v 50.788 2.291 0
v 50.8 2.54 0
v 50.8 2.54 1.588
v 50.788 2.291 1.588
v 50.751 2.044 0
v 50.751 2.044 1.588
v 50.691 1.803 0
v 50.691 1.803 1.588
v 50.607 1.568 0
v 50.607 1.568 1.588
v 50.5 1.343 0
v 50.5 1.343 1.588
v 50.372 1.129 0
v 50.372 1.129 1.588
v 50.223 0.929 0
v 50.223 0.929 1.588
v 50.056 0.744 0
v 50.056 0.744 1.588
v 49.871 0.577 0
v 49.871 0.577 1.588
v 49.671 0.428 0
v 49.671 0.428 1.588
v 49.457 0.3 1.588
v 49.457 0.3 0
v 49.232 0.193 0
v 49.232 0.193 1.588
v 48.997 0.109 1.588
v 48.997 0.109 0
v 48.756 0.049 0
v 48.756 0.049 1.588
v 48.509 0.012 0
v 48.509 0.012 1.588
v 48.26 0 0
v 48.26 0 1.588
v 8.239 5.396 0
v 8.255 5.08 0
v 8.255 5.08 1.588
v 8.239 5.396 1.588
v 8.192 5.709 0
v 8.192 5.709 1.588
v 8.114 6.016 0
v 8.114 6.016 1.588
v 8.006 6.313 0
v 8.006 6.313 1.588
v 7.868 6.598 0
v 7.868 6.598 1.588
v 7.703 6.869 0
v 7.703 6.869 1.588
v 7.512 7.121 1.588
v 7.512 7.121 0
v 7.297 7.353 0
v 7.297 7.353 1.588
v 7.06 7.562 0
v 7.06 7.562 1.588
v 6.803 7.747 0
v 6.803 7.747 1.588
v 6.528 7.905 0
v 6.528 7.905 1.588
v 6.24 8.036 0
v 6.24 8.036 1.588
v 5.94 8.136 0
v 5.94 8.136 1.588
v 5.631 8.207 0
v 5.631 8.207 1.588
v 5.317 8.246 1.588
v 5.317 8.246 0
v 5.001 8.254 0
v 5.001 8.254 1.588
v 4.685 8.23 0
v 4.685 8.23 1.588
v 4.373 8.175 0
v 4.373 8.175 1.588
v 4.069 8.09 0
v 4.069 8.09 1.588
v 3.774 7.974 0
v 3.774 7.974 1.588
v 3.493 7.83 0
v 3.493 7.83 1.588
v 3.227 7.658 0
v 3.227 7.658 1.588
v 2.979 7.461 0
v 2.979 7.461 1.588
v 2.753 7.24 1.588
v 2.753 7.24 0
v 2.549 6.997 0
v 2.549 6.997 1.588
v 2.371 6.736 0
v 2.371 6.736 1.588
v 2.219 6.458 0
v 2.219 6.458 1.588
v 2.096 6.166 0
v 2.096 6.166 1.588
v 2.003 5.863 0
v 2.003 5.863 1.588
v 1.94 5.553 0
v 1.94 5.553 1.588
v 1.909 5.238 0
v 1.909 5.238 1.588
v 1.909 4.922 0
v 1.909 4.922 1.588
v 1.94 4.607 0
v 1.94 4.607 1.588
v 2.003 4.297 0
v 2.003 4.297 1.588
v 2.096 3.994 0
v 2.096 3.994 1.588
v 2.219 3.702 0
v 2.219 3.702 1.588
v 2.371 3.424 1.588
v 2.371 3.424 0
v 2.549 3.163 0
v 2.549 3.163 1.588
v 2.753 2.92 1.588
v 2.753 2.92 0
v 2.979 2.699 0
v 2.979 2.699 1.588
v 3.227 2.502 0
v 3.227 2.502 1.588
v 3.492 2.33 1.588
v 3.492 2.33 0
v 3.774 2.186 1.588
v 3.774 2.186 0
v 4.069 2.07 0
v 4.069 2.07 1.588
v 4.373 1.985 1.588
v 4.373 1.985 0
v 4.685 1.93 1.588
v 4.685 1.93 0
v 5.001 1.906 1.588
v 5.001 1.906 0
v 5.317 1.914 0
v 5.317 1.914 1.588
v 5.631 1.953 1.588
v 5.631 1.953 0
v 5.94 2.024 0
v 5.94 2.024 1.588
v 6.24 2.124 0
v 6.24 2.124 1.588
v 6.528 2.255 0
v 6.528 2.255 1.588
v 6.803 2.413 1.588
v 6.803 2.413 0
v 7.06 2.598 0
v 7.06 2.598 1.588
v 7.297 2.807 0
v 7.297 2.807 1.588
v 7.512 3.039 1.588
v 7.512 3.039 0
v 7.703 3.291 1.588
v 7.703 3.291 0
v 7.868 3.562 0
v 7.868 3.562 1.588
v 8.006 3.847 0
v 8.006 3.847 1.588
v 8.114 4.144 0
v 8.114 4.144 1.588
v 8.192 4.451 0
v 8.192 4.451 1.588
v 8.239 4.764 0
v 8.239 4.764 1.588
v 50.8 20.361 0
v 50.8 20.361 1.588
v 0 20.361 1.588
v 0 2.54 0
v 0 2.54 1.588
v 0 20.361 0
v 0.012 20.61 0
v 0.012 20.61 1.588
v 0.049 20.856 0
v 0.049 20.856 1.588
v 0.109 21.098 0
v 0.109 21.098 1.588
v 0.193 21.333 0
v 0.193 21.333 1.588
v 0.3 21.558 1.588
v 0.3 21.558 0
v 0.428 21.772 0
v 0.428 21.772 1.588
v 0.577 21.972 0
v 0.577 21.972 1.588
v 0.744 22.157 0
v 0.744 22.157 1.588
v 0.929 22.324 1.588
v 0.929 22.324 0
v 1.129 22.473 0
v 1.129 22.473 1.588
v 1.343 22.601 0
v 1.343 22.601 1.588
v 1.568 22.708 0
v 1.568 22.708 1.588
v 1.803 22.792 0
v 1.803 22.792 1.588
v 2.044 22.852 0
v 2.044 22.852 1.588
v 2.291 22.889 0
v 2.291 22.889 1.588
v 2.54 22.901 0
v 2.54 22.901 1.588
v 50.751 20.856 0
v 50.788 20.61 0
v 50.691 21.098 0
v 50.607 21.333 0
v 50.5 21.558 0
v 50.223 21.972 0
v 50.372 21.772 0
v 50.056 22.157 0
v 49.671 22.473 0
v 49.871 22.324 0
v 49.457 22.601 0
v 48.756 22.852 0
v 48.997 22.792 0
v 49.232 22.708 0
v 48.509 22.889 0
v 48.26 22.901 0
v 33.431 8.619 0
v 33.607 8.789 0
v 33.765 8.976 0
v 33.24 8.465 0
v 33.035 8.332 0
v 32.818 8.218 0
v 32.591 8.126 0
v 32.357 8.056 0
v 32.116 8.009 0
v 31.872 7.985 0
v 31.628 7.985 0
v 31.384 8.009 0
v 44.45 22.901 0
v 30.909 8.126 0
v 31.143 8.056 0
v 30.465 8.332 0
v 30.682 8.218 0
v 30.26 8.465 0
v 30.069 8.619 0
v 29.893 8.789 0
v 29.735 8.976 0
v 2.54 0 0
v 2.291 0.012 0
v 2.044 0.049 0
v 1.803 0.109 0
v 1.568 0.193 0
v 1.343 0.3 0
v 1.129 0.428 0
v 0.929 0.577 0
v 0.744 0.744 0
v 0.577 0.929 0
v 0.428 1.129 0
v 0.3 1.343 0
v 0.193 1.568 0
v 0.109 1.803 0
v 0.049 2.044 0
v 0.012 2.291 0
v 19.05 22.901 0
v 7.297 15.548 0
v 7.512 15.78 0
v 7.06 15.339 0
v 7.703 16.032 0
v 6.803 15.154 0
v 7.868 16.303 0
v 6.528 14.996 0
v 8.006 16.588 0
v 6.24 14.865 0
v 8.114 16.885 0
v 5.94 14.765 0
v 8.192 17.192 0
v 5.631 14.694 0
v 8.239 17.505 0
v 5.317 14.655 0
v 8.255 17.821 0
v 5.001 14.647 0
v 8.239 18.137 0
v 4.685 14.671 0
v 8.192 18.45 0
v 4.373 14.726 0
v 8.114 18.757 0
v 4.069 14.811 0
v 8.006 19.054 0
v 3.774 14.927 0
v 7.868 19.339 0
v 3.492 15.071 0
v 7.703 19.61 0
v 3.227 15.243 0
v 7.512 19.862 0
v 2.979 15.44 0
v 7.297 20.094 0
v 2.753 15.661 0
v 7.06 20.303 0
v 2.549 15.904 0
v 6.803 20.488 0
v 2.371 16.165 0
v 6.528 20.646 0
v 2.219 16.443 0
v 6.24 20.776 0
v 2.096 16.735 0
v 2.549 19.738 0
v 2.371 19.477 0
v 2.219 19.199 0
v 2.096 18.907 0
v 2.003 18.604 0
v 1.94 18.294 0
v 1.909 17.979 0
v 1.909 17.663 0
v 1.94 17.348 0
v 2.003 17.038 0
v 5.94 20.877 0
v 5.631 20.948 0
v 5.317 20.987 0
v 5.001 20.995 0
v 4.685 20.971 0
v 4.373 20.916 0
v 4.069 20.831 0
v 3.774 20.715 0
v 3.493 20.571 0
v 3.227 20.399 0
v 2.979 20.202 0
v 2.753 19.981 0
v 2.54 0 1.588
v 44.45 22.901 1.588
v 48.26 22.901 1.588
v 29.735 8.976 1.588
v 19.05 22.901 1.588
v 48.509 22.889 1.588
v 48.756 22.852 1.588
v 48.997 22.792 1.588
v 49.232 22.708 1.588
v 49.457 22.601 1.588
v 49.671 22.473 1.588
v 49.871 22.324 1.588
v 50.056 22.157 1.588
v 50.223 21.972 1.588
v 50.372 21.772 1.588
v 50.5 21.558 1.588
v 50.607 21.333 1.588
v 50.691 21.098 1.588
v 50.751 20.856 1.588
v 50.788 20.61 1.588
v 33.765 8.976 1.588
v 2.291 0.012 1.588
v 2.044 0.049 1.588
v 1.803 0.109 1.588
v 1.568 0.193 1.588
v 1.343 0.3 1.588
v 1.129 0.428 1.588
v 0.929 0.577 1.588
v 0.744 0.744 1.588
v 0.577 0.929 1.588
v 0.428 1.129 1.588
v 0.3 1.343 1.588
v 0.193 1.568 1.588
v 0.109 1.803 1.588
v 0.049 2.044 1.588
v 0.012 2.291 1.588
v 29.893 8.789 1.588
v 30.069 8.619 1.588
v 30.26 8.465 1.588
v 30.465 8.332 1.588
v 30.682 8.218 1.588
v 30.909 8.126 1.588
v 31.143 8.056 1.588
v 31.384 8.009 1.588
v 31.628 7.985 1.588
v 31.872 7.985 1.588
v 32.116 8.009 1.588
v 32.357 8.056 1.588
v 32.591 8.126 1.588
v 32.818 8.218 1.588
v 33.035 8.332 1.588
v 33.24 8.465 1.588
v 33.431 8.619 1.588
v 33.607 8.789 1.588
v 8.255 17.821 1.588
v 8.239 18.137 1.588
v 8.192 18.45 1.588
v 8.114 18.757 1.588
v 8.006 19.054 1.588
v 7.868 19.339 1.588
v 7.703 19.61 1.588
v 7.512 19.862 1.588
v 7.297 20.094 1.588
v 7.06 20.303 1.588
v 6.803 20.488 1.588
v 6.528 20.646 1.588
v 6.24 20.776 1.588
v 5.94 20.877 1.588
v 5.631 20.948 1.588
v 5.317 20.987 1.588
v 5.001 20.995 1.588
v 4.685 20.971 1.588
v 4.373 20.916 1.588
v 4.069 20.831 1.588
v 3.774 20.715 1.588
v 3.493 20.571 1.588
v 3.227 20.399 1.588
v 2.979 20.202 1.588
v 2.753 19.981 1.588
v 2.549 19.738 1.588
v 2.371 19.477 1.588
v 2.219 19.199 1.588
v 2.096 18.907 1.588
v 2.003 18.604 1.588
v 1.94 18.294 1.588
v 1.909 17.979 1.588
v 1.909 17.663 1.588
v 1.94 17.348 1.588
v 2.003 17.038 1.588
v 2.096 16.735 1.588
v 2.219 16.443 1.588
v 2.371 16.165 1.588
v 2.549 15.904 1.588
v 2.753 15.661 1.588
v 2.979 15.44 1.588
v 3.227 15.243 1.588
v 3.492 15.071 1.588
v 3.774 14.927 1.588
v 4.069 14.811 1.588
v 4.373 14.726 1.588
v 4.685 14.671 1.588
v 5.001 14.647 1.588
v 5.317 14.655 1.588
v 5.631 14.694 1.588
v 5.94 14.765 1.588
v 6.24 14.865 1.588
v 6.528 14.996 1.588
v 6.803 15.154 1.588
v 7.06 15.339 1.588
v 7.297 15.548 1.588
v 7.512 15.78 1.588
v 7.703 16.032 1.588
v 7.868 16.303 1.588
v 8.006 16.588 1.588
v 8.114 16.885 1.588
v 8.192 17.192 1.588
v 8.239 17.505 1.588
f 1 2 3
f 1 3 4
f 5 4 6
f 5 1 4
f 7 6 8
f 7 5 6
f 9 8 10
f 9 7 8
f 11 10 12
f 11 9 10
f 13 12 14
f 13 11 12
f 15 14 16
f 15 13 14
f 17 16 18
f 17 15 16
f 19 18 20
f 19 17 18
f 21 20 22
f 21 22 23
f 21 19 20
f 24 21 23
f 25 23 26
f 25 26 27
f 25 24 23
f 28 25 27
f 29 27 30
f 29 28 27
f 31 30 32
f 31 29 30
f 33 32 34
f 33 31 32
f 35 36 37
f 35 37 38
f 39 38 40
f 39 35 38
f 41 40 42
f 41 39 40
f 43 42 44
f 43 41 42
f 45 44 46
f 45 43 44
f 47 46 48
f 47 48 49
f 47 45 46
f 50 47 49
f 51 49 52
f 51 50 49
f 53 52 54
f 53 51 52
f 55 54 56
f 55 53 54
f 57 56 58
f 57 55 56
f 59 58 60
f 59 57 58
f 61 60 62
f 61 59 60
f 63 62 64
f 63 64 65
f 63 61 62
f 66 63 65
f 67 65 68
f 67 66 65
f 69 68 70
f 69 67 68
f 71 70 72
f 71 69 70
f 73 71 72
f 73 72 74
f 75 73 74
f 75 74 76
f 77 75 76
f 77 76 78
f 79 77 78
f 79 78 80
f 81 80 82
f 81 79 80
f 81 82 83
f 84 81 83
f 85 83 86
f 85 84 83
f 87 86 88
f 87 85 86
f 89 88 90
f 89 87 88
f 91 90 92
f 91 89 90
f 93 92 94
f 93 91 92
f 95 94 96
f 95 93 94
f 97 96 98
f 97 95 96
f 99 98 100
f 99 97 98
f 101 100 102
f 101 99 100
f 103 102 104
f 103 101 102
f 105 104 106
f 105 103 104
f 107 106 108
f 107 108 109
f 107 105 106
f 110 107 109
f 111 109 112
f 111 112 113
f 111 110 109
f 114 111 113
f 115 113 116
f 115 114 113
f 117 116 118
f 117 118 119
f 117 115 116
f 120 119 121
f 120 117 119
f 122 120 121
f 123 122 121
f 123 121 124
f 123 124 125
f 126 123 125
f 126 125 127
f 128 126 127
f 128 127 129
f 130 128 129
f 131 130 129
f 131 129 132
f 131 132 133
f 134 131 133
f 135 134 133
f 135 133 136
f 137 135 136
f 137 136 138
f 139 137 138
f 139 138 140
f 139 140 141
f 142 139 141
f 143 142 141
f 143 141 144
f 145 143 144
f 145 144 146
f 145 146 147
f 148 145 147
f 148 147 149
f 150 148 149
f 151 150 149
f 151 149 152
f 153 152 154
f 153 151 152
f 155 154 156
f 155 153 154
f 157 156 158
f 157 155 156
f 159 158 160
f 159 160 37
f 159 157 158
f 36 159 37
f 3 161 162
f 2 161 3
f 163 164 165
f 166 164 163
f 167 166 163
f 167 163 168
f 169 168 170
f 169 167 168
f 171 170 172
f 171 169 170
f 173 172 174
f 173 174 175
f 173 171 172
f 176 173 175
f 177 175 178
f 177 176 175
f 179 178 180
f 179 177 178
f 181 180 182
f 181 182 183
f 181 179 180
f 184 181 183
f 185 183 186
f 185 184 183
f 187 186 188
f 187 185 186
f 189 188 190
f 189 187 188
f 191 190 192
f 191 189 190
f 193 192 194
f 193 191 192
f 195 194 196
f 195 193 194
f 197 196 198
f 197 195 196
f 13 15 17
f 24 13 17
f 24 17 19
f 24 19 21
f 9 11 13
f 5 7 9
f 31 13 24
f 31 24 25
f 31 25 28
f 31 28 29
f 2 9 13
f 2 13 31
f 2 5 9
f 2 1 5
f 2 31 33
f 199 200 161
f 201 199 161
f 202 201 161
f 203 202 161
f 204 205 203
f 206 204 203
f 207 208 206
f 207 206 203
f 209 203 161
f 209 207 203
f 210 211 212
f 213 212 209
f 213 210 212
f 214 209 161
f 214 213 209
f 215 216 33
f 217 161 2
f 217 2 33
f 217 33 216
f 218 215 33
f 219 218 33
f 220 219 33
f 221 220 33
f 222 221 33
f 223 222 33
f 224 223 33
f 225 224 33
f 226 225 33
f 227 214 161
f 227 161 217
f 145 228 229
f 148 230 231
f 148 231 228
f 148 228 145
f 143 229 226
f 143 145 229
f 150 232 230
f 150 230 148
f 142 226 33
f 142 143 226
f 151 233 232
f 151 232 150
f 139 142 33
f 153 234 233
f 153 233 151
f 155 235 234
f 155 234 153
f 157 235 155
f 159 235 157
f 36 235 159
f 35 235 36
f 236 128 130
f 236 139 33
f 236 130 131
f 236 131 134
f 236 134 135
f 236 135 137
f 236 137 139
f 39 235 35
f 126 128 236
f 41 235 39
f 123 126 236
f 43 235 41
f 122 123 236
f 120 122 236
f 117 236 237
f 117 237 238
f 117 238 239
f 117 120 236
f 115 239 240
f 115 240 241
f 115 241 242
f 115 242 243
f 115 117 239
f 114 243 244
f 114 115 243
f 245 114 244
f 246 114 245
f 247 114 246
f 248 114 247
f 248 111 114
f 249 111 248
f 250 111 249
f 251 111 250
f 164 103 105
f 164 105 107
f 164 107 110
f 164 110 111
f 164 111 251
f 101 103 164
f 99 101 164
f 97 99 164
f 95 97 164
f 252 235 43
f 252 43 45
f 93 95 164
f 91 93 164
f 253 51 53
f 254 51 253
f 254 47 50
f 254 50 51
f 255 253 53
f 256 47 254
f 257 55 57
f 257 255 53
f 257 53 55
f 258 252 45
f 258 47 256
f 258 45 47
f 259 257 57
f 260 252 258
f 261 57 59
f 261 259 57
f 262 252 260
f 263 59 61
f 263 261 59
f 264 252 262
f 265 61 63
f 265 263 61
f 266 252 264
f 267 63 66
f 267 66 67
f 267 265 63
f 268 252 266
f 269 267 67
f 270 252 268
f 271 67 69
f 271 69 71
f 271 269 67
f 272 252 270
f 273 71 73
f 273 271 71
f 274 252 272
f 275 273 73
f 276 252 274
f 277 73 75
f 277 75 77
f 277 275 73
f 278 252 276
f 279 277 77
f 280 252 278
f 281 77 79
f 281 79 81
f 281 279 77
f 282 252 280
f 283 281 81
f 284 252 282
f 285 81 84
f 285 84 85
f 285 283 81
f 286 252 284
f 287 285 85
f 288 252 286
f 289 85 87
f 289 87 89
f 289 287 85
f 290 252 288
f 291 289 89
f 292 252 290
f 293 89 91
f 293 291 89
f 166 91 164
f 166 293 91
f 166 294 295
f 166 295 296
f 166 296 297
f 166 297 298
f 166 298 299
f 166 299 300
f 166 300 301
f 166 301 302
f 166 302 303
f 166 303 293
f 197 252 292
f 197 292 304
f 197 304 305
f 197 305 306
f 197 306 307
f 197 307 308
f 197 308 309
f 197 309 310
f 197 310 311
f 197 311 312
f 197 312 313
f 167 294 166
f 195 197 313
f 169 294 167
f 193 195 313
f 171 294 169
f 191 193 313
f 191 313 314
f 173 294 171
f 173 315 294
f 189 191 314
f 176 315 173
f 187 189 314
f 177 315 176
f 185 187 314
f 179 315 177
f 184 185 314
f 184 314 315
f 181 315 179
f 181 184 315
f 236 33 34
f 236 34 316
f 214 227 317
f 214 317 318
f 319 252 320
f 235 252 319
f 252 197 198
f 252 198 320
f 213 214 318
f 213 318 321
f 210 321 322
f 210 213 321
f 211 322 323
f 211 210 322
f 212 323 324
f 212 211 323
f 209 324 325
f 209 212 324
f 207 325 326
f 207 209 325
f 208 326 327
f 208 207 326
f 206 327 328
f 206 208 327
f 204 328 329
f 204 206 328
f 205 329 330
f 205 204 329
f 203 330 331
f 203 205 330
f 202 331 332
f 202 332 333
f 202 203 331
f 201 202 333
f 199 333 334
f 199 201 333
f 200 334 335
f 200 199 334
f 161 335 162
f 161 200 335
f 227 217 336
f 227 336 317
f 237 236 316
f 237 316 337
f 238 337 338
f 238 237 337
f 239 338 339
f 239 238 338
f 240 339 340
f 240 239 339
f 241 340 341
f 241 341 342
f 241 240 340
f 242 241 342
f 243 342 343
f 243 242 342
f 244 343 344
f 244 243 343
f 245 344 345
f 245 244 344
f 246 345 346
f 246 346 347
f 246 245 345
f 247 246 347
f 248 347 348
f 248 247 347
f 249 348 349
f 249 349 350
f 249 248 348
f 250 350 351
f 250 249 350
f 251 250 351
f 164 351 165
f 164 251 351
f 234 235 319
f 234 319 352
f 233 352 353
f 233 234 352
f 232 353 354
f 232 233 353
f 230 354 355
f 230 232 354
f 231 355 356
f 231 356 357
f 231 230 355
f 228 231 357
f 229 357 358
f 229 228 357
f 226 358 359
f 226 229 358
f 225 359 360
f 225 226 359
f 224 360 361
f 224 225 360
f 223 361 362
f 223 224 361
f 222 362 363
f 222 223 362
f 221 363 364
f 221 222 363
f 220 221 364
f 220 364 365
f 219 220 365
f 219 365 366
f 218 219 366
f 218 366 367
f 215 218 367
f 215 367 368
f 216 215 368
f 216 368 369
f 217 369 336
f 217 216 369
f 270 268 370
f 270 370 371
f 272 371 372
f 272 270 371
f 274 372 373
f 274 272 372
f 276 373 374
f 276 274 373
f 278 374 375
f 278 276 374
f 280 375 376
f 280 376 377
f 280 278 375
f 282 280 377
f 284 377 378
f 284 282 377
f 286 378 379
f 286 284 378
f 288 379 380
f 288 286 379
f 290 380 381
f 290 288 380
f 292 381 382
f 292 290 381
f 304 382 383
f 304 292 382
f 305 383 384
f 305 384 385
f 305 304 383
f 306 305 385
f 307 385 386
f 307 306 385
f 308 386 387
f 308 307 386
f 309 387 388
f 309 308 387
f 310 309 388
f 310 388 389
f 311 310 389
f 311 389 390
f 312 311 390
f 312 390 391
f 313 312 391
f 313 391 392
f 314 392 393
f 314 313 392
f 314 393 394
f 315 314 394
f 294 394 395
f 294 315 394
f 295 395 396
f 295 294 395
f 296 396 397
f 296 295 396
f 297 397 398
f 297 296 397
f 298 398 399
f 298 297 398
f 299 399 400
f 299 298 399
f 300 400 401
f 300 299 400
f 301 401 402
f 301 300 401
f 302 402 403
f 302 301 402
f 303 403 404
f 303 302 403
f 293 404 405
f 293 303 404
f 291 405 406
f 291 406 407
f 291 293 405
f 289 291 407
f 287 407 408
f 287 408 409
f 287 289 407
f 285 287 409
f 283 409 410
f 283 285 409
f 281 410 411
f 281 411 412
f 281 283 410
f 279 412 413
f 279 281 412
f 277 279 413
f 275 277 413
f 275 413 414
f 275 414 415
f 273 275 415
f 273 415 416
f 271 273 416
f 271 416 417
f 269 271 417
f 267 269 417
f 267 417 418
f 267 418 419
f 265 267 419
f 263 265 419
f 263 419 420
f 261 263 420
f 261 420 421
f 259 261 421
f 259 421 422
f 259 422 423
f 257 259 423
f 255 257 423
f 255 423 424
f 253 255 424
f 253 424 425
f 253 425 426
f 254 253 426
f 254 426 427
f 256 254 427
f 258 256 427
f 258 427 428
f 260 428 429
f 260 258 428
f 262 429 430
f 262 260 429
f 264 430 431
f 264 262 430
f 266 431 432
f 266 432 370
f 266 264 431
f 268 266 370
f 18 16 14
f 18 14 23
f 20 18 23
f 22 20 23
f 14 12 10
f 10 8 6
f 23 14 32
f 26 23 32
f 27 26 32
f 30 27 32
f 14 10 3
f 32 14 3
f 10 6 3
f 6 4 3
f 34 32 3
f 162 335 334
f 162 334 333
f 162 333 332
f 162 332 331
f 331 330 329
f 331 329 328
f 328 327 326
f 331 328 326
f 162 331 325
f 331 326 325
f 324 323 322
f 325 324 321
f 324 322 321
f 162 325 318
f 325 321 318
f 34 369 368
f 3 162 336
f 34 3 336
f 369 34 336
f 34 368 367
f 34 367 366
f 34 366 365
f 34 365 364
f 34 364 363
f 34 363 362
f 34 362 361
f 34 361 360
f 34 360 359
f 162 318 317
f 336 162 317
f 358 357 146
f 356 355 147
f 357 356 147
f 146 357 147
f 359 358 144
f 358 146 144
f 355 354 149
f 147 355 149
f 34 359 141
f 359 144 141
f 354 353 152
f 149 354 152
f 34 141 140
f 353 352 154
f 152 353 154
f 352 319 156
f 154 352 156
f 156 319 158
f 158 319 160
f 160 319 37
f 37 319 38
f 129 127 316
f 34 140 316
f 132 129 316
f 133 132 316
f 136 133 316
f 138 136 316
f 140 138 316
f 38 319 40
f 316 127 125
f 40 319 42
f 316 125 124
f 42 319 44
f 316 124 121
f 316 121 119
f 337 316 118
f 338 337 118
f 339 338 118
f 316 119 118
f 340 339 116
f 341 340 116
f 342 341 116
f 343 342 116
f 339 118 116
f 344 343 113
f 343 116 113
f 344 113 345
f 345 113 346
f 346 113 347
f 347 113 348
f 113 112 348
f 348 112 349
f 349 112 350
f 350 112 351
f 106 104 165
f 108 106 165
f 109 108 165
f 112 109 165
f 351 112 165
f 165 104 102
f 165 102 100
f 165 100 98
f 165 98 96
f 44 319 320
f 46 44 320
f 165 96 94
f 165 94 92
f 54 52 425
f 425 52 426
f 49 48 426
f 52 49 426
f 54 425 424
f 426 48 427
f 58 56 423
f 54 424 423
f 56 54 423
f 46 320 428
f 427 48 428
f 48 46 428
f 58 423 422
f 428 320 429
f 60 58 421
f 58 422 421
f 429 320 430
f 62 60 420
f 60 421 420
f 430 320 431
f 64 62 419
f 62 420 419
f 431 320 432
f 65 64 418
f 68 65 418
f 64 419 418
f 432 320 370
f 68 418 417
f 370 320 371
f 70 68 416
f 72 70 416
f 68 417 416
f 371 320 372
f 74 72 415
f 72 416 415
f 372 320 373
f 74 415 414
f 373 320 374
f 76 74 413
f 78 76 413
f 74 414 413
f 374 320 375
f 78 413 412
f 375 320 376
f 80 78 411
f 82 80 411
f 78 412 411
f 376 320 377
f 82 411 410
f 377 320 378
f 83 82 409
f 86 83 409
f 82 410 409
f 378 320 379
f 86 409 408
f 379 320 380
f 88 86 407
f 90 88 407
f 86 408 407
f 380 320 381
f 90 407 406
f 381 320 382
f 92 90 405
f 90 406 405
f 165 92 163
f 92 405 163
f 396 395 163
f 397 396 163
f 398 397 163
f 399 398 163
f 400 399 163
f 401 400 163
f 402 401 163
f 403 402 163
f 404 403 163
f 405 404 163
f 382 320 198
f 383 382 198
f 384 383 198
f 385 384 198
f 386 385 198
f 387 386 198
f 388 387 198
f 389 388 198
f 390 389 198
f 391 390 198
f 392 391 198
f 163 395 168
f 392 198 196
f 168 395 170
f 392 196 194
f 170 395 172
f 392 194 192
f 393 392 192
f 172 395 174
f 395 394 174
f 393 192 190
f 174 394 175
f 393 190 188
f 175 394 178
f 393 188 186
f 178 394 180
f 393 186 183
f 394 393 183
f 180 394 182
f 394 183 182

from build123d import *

# Parameters (mm, degrees)
SKETCH2_R           = 3.175
BOSS_EXTRUDE1_DEPTH = 1.5875


with BuildPart() as part:
    # Sketch2 → Boss-Extrude1 (new body)
    with BuildSketch(Plane.XY):
        with BuildLine():
            Line((19.05, 22.900962235), (29.734882516, 8.976152235))
            ThreePointArc((29.734882516, 8.976152235), (31.75, 7.982406265), (33.765117484, 8.976152235))
            Line((33.765117484, 8.976152235), (44.45, 22.900962235))
            Line((44.45, 22.900962235), (48.26, 22.900962235))
            ThreePointArc((48.26, 22.900962235), (50.056051224, 22.157013459), (50.8, 20.360962235))
            Line((50.8, 20.360962235), (50.8, 2.54))
            ThreePointArc((50.8, 2.54), (50.056051224, 0.743948776), (48.26, 0))
            Line((48.26, 0), (2.54, 0))
            ThreePointArc((2.54, 0), (0.743948776, 0.743948776), (0, 2.54))
            Line((0, 2.54), (0, 20.360962235))
            ThreePointArc((0, 20.360962235), (0.743948776, 22.157013459), (2.54, 22.900962235))
            Line((2.54, 22.900962235), (19.05, 22.900962235))
        make_face()
        with Locations((5.08, 17.820962235)):
            Circle(SKETCH2_R, mode=Mode.SUBTRACT)
        with Locations((5.08, 5.08)):
            Circle(SKETCH2_R, mode=Mode.SUBTRACT)
    extrude(amount=BOSS_EXTRUDE1_DEPTH)


solid = part.part
